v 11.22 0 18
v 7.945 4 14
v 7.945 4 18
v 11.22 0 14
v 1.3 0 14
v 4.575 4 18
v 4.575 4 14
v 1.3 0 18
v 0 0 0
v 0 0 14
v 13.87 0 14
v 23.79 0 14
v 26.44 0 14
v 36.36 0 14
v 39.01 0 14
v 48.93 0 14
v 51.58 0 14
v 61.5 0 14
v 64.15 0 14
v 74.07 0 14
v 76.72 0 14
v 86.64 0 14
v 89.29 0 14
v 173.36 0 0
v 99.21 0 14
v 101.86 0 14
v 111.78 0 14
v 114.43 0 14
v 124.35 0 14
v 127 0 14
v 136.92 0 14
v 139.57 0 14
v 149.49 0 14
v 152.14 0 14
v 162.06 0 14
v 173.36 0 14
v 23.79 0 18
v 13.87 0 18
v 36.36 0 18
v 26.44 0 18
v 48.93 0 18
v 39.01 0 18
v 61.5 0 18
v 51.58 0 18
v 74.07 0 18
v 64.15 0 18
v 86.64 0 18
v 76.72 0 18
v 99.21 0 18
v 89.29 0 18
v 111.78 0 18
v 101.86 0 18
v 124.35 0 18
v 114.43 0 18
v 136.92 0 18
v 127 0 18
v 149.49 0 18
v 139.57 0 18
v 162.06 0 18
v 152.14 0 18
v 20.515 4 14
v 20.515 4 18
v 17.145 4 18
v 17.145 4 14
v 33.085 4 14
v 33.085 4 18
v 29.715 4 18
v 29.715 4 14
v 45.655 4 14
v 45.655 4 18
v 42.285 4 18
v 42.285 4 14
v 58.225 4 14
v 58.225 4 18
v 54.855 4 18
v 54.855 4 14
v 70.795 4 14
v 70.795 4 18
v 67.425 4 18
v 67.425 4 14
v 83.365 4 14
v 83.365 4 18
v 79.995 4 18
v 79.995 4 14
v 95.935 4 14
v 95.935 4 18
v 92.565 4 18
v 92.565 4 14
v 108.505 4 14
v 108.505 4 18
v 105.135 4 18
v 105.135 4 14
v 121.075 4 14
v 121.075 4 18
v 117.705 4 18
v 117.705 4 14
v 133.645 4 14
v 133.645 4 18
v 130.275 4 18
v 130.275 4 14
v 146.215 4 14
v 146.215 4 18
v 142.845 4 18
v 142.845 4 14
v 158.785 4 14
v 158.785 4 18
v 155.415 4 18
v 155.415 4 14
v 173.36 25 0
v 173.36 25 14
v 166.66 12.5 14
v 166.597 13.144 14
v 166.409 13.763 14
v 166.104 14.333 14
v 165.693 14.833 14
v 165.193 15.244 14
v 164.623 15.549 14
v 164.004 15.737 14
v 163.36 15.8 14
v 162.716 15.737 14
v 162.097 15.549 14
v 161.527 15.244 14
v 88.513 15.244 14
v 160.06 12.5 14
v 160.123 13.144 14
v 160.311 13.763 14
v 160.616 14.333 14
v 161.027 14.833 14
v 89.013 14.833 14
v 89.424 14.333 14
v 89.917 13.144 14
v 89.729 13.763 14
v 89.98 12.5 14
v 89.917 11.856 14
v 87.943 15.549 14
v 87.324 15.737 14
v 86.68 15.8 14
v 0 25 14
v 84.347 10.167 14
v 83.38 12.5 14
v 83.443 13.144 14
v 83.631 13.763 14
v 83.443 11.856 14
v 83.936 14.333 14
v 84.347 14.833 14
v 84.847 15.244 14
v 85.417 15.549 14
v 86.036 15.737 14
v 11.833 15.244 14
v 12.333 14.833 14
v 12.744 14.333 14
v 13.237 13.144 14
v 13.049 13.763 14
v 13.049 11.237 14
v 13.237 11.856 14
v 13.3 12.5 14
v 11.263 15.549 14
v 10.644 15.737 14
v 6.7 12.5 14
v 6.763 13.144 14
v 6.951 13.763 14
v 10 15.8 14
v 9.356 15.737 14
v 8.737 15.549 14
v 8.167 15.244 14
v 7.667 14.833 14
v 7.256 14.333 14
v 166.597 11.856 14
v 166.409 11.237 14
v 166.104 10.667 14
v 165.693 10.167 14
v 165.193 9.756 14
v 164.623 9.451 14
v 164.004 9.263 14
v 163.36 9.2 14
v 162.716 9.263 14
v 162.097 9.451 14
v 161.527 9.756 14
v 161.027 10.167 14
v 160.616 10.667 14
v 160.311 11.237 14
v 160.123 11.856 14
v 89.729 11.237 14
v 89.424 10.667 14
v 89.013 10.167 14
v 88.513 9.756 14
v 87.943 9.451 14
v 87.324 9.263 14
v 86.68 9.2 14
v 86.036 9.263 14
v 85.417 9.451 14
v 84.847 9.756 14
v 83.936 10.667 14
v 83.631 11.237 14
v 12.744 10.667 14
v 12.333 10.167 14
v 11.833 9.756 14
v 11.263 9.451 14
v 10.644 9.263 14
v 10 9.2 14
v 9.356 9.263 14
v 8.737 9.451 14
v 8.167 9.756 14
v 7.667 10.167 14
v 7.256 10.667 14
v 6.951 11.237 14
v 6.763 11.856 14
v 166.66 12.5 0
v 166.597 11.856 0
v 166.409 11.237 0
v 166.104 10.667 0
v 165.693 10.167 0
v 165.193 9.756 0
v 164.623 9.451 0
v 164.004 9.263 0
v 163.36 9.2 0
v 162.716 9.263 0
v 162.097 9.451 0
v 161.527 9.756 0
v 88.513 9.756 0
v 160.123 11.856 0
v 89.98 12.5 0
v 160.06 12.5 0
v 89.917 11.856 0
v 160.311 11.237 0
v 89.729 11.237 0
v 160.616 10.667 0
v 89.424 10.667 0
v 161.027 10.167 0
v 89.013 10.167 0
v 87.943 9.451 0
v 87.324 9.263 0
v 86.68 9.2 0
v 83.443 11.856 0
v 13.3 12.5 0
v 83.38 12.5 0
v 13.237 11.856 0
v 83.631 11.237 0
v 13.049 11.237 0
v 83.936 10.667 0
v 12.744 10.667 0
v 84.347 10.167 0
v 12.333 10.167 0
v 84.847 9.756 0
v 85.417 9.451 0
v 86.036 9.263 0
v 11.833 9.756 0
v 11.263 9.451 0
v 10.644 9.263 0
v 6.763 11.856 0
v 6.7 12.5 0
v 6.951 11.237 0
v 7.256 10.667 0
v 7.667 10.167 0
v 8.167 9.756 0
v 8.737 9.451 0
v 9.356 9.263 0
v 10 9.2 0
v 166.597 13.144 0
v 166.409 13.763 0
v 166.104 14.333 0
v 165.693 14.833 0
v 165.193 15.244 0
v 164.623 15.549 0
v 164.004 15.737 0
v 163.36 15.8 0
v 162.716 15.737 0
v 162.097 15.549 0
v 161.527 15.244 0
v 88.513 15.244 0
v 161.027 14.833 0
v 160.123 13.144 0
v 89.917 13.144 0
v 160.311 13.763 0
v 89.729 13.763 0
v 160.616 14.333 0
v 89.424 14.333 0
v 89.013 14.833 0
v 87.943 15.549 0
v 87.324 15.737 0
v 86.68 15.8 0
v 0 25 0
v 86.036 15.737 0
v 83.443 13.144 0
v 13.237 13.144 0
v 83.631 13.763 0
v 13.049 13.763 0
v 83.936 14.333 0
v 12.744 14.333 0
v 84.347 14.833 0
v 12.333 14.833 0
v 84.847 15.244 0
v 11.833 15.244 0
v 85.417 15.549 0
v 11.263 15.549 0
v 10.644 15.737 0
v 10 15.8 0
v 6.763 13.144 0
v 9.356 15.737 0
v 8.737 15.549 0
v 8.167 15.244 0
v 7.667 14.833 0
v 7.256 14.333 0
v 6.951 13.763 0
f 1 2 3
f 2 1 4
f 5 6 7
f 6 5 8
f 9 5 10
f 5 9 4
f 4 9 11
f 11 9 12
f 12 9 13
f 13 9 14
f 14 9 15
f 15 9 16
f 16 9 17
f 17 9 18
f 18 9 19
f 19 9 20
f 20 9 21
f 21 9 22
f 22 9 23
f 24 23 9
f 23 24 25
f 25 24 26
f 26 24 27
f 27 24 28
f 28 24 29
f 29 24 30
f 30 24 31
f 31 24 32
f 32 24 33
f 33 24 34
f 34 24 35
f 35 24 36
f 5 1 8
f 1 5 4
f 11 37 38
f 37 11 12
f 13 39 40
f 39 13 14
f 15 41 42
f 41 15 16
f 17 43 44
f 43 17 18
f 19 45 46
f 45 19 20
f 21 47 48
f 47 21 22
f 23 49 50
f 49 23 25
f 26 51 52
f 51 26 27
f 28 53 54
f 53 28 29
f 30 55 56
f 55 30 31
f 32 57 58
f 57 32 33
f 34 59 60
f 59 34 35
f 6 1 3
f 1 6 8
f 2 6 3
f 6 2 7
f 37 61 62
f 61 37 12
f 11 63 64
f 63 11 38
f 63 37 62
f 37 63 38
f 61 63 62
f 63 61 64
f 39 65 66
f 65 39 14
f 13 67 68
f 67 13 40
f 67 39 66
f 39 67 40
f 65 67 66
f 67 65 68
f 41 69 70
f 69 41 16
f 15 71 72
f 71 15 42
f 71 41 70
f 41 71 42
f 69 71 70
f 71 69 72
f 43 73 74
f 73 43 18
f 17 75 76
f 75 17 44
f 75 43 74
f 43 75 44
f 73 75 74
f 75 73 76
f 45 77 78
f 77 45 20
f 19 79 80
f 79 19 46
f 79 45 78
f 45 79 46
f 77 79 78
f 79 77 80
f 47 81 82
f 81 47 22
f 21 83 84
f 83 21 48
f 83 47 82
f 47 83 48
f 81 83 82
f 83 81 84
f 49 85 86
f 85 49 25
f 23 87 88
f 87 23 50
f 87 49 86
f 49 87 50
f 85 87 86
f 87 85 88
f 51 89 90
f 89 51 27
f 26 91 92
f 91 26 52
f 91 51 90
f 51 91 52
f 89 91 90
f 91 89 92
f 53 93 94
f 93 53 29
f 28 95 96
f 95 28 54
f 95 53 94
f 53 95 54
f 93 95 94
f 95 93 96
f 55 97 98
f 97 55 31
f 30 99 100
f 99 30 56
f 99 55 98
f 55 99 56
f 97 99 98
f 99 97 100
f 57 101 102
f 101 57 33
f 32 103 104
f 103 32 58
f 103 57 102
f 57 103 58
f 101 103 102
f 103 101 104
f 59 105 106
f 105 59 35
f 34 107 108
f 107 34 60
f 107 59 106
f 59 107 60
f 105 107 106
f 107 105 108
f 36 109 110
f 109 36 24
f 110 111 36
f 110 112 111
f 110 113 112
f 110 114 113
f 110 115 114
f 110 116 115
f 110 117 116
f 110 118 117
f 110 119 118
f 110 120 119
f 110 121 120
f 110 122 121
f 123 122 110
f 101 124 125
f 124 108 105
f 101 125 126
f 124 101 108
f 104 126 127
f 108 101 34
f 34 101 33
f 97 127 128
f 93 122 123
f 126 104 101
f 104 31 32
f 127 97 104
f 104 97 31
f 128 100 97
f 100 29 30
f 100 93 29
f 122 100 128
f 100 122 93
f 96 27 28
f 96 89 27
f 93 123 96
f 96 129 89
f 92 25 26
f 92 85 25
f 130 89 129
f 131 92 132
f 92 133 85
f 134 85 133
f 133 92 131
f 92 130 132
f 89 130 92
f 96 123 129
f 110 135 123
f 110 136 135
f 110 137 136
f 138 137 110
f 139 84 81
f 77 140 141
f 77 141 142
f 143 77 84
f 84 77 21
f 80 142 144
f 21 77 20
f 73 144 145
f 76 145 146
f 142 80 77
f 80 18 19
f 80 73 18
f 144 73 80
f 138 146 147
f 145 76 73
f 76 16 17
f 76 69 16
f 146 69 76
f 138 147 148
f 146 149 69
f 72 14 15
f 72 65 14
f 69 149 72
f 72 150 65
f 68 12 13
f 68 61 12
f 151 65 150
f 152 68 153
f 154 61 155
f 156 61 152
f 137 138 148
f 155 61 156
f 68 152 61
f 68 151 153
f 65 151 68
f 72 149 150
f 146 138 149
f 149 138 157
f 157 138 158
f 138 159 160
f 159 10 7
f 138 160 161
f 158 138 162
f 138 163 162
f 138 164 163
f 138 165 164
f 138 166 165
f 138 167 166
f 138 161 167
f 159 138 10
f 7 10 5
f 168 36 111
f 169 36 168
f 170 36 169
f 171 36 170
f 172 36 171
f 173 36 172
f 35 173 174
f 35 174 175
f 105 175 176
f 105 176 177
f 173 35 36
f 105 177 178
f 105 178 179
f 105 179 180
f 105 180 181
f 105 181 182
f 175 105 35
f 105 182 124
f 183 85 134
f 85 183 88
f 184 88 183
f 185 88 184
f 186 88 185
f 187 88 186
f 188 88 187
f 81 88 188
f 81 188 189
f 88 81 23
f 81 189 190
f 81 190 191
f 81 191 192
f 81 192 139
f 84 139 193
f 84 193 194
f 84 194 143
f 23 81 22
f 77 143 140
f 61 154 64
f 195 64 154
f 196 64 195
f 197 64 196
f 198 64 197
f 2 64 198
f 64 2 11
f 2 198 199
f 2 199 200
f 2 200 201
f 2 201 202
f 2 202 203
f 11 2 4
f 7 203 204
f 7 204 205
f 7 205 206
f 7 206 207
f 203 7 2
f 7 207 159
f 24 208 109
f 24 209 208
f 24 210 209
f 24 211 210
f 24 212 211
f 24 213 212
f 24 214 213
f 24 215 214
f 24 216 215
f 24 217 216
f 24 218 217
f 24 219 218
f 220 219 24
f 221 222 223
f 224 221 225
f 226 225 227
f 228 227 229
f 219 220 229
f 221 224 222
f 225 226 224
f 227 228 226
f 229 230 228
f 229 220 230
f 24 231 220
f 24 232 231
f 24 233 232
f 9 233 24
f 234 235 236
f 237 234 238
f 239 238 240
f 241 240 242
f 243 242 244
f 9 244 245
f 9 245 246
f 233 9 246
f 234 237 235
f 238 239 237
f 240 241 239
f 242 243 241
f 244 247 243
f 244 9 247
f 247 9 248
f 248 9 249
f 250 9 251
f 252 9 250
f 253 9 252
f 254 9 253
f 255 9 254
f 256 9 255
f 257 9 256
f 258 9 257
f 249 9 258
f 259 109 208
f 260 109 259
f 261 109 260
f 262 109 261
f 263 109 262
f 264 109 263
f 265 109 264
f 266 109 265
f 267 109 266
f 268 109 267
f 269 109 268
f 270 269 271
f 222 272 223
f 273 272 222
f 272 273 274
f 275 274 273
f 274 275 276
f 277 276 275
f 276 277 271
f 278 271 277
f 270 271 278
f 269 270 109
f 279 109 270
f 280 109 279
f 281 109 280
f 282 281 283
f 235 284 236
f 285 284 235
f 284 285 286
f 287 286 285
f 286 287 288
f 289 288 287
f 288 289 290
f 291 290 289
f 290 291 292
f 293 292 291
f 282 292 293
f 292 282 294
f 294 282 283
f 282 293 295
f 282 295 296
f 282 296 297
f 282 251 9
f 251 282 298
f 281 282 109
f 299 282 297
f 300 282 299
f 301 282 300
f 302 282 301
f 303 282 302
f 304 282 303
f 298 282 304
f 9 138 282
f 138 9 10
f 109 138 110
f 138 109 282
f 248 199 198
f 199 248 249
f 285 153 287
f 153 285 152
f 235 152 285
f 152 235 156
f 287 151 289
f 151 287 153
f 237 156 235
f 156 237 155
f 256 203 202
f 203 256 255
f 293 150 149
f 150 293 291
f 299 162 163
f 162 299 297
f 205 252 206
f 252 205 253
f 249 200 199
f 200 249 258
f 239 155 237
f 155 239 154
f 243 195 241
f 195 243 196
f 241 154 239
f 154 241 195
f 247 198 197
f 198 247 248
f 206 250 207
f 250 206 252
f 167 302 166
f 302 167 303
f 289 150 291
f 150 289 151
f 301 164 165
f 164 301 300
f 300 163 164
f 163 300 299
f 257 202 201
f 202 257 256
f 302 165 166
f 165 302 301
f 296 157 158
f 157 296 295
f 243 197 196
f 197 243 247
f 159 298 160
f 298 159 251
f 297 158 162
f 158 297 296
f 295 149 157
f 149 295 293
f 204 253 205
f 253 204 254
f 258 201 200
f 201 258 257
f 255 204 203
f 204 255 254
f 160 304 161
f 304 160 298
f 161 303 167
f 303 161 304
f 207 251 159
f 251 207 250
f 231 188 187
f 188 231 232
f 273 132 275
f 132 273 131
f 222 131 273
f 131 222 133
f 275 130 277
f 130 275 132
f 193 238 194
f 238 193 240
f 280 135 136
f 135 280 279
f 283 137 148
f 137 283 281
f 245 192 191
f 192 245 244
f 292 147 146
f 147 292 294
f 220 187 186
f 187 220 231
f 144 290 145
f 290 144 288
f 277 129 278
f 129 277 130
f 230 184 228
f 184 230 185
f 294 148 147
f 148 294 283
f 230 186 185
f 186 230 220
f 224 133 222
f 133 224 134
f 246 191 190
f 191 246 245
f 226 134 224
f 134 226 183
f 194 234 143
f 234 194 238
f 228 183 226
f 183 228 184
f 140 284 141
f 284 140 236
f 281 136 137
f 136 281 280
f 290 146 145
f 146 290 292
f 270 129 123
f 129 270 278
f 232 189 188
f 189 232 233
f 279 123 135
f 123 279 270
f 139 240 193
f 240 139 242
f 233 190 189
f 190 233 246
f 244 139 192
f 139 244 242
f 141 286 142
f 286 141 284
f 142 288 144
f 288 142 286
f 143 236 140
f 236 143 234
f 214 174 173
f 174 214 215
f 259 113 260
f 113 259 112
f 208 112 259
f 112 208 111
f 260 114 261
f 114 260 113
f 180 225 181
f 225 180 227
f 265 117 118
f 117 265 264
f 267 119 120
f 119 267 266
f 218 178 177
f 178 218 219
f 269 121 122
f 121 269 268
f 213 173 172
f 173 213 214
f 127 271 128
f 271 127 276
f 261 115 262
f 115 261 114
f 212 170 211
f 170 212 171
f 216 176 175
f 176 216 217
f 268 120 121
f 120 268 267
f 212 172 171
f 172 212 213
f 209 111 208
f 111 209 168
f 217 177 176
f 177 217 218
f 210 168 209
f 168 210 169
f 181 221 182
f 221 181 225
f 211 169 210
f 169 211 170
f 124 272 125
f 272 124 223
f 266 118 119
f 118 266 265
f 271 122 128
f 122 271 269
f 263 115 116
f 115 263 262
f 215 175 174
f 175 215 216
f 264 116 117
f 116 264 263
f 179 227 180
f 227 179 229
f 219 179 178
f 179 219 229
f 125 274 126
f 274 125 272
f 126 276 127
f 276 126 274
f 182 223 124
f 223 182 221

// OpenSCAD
$fn = 32;

// ----------------------------------------------------------------------
// Gear rack: m=4 z=13, 173.36 x 25 x 18 mm
// ----------------------------------------------------------------------

// --- parameters (mm) ---
bar_len = 173.36;         // rack length, X
bar_w = 25;               // rack width, Y
bar_h = 18;               // overall height, Z
gear_module = 4;          // module
base_t = 14;              // tooth root line height
pitch = 12.57;            // circular pitch
tip_w = 3.37;             // tooth thickness at the tip
root_w = 9.92;            // tooth thickness at the root line
hole_d = 6.6;             // mounting hole
sink = 0.6;               // tooth root overlap into the body

tooth_span = 163.36;

module tooth(x0) {
  /* 20 deg flank profile, sunk into the body for a positive overlap */
  translate([x0, 0, base_t - sink])
    linear_extrude(height = bar_h - base_t + sink)
      polygon(points = [[-root_w / 2, 0], [root_w / 2, 0],
                        [tip_w / 2, bar_h - base_t],
                        [-tip_w / 2, bar_h - base_t]]);
}

difference() {
  union() {
    cube([bar_len, bar_w, base_t]);
    for (i = [0 : 13 - 1])
      tooth((i + 0.5) * pitch + (tooth_span - 13 * pitch) / 2);
  }
  translate([10, 12.5, -1]) cylinder(h = base_t + 2, d = hole_d);
  translate([86.68, 12.5, -1]) cylinder(h = base_t + 2, d = hole_d);
  translate([163.36, 12.5, -1]) cylinder(h = base_t + 2, d = hole_d);
}
